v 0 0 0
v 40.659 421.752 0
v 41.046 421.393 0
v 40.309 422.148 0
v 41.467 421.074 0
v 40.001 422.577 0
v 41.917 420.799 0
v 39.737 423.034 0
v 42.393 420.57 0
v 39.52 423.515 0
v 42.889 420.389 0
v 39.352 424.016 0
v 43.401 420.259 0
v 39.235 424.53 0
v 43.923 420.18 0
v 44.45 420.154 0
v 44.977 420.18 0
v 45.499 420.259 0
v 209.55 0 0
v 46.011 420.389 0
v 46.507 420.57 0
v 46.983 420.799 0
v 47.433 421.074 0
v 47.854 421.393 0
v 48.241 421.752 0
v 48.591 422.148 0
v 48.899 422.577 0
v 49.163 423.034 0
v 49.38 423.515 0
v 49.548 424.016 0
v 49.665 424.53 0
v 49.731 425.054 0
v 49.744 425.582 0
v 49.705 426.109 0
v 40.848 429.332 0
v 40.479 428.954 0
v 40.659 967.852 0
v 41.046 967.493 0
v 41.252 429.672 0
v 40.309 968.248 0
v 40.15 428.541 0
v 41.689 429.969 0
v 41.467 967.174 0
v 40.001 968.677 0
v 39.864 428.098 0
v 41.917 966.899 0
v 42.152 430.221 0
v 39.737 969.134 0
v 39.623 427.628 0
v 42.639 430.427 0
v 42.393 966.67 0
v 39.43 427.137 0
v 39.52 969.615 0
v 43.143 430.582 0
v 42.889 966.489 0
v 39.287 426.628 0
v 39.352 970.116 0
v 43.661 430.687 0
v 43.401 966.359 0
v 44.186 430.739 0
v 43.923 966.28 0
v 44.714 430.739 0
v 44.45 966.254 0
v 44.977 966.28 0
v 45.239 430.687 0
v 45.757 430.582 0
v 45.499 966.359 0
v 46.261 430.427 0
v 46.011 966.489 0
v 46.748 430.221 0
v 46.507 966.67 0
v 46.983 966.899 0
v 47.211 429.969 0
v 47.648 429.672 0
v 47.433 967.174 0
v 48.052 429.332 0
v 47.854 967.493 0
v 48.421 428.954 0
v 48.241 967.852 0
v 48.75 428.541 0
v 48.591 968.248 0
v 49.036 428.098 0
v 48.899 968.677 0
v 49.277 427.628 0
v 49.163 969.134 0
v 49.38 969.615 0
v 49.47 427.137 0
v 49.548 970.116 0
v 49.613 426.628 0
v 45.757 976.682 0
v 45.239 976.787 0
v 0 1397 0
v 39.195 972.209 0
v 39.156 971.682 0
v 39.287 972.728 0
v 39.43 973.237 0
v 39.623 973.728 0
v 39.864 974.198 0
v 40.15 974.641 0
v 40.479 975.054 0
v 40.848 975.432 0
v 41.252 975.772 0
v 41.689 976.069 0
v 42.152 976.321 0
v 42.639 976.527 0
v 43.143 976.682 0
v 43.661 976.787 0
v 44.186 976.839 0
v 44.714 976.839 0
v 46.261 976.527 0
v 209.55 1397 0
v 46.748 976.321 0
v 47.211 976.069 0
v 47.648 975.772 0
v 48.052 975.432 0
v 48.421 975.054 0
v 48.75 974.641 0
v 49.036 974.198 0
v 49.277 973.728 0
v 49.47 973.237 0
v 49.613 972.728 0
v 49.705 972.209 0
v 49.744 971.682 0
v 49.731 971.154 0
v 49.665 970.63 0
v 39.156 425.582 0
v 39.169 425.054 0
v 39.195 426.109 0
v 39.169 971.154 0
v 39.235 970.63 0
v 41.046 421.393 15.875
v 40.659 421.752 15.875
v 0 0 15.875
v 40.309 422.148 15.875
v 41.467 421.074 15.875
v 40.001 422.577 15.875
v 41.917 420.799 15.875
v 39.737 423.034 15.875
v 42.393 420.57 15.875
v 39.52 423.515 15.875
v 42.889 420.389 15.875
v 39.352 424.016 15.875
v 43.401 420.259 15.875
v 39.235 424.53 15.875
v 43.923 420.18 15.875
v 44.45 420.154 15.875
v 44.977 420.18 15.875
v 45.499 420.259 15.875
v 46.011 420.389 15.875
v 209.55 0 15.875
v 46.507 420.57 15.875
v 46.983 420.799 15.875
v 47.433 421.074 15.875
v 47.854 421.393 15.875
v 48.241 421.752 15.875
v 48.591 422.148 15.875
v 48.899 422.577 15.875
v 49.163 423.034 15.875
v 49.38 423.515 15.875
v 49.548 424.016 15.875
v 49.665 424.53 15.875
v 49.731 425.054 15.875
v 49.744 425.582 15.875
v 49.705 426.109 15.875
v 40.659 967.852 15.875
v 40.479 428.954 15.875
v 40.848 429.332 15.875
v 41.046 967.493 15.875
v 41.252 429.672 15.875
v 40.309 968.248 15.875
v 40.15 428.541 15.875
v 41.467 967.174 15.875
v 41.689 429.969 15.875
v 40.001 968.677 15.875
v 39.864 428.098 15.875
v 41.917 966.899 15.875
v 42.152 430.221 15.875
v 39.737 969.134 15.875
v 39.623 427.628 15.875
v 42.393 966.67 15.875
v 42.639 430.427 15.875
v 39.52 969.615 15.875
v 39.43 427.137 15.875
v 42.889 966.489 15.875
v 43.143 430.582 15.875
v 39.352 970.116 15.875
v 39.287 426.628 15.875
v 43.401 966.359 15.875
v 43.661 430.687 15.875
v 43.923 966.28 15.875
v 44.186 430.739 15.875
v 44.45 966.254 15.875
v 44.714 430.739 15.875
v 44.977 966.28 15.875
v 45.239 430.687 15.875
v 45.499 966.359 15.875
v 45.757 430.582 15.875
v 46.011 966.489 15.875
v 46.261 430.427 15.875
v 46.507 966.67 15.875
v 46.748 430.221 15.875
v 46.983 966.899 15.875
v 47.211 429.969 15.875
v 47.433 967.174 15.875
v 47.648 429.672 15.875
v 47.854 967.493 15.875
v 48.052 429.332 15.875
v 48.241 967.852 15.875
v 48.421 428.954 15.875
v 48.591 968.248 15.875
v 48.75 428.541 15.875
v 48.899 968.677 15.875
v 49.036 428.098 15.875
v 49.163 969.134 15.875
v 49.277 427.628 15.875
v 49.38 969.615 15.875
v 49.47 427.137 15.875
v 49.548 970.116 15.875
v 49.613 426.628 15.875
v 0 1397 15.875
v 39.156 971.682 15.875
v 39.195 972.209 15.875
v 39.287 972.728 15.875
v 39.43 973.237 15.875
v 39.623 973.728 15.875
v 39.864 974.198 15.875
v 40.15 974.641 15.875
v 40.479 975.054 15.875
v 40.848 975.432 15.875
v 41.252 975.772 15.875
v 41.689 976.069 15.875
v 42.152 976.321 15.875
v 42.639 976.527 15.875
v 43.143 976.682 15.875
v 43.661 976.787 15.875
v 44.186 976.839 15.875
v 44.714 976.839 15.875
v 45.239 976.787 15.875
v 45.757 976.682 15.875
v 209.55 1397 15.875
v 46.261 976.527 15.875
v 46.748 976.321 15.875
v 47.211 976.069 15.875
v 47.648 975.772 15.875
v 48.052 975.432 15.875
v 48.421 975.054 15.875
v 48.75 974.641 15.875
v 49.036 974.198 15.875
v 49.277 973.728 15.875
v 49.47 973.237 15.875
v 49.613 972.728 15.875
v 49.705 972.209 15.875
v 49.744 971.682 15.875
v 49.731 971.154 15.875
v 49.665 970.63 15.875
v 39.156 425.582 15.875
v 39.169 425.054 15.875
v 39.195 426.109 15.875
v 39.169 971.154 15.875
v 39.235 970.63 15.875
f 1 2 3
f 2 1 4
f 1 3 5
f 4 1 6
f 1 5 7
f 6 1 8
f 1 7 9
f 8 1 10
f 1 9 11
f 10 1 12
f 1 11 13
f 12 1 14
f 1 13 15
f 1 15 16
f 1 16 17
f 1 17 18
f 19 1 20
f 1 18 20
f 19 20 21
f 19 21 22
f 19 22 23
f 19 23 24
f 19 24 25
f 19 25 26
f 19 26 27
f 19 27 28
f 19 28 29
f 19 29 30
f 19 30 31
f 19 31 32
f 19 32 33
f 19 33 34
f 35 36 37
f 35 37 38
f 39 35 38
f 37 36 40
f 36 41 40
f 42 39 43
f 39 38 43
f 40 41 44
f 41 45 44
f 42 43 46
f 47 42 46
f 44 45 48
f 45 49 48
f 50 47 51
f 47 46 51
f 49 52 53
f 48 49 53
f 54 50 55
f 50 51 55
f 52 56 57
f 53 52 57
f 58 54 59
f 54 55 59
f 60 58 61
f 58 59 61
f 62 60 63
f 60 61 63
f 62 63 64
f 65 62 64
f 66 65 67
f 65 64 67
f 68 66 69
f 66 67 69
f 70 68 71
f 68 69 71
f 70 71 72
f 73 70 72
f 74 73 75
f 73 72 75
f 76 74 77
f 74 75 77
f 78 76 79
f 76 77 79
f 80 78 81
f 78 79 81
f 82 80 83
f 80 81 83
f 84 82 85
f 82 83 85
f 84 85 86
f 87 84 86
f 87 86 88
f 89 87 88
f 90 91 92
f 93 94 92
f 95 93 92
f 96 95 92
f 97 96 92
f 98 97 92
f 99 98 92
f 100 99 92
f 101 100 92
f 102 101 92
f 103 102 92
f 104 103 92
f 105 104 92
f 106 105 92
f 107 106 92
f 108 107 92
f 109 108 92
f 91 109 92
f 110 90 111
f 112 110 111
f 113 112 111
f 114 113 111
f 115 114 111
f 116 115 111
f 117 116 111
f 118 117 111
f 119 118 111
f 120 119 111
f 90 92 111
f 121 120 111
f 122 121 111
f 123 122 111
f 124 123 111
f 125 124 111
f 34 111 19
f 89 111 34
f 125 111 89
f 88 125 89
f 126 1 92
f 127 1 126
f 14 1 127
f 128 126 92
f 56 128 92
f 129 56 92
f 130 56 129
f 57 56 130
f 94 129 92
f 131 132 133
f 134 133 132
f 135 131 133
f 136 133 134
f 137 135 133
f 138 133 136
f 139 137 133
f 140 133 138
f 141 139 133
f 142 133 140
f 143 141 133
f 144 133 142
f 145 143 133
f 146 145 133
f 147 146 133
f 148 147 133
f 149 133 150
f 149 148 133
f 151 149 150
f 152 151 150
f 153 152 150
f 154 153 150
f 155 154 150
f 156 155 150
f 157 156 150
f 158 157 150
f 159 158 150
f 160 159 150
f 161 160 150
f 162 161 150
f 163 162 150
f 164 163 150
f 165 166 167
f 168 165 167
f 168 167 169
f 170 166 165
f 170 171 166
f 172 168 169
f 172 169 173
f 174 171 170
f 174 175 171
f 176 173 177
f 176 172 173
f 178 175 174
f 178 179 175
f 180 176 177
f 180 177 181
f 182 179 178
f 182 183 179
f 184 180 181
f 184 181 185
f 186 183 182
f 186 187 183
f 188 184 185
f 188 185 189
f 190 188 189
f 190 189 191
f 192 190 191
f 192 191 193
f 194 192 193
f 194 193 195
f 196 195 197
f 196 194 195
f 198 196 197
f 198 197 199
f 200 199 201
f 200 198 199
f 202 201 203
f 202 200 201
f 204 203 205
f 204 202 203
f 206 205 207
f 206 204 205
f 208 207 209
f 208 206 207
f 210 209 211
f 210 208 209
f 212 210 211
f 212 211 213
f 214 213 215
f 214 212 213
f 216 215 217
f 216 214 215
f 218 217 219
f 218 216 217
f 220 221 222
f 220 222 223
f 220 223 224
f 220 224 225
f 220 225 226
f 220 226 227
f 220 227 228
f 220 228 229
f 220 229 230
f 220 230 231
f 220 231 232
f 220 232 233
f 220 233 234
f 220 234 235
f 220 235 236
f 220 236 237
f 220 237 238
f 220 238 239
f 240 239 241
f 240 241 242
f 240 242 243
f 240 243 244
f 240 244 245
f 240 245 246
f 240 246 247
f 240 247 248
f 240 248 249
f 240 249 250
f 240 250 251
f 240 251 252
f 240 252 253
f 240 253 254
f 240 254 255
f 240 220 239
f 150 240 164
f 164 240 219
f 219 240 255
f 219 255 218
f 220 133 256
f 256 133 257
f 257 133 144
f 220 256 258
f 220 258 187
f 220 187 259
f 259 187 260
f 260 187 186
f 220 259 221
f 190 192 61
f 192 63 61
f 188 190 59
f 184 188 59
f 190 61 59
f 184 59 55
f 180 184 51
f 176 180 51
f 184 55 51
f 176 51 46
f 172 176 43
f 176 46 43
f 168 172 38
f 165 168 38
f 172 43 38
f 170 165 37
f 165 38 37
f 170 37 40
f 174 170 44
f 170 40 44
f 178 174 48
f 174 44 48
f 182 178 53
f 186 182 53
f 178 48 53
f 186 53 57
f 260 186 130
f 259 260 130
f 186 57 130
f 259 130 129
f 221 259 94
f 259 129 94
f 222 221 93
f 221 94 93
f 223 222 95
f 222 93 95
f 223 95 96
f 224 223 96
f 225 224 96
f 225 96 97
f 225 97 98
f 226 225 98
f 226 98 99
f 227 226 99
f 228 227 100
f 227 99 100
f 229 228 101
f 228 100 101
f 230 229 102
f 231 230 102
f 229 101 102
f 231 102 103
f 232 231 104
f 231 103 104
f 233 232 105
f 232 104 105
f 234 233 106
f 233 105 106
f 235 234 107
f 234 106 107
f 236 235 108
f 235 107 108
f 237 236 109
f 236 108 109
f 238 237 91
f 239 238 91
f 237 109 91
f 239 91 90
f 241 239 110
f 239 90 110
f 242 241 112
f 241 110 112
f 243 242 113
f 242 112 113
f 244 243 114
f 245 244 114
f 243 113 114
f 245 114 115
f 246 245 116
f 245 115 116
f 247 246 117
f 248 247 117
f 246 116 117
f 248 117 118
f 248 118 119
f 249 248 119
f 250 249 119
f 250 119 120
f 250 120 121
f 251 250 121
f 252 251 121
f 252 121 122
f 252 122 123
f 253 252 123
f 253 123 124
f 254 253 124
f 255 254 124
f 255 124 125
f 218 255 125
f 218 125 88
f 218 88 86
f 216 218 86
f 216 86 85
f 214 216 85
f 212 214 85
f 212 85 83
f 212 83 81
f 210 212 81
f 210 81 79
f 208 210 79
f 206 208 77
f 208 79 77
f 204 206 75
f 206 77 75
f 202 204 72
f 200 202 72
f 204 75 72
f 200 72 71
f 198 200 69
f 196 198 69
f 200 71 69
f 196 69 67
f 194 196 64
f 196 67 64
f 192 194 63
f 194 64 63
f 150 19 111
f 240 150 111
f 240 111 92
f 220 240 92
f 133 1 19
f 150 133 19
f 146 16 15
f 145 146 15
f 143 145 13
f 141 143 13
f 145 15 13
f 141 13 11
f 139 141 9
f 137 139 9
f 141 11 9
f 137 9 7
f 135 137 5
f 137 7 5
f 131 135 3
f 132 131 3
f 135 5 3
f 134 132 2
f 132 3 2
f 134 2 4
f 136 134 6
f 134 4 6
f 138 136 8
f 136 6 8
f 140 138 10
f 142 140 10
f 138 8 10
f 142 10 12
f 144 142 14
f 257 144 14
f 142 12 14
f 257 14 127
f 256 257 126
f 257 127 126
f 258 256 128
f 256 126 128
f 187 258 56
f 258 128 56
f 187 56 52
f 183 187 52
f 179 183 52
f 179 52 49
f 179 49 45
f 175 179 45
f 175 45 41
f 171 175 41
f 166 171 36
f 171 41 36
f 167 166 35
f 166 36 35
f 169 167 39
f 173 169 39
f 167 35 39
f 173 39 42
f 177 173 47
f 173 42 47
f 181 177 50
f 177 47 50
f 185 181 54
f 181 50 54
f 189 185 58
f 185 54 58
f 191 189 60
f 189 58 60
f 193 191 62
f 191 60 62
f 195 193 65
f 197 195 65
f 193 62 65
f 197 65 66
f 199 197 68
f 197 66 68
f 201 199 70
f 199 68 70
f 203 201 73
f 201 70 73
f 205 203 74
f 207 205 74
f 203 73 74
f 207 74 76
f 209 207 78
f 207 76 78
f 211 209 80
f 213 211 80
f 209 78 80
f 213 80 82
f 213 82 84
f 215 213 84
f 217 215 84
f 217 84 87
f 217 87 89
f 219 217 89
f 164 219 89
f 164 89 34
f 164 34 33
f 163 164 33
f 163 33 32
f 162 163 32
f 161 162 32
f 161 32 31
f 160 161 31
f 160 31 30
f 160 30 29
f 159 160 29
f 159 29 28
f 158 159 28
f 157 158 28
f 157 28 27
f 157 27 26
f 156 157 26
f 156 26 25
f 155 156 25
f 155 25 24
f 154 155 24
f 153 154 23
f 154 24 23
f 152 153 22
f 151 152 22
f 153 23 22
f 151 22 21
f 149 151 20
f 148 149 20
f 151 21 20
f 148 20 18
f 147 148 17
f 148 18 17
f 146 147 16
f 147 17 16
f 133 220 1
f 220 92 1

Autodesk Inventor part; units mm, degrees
ref_plane "YZ Plane" through (0, 0, 0) normal (1, 0, 0) x (0, 1, 0)
ref_plane "XZ Plane" through (0, 0, 0) normal (0, 1, 0) x (-1, 0, 0)
ref_plane "XY Plane" through (0, 0, 0) normal (0, 0, 1) x (1, 0, 0)
sketch "Sketch2" plane through (0, 0, 0) normal (0, 0, 1) x (1, 0, 0)
  line L0 (0, 0) -> (209.55, 0)
  line L1 (209.55, 0) -> (209.55, 1397)
  line L2 (209.55, 1397) -> (0, 1397)
  line L3 (0, 1397) -> (0, 0)
  dimension "d4" = 209.55
  dimension "d5" = 1397
extrude "Extrusion2" add sketch "Sketch2" along normal blind 15.875
sketch "Sketch4" plane through (0, 0, 15.875) normal (0, 0, 1) x (1, 0, 0)
  line L0 (0, 1397) -> (0, 0) projected
  line L1 (0, 971.55) -> (44.45, 971.55)
  line L2 (44.45, 971.55) -> (44.45, 425.45)
  dimension "d18" = 44.45
hole "Hole2" at (44.45, 971.55, 15.875) at (44.45, 425.45, 15.875) direction (0, 0, -1) diameter 10.5918 end through all thread size "1/2-13 UNC" class "2B" standard "ANSI Unified Screw Threads"
properties part number "model 2 comp 2 floor part 1"
